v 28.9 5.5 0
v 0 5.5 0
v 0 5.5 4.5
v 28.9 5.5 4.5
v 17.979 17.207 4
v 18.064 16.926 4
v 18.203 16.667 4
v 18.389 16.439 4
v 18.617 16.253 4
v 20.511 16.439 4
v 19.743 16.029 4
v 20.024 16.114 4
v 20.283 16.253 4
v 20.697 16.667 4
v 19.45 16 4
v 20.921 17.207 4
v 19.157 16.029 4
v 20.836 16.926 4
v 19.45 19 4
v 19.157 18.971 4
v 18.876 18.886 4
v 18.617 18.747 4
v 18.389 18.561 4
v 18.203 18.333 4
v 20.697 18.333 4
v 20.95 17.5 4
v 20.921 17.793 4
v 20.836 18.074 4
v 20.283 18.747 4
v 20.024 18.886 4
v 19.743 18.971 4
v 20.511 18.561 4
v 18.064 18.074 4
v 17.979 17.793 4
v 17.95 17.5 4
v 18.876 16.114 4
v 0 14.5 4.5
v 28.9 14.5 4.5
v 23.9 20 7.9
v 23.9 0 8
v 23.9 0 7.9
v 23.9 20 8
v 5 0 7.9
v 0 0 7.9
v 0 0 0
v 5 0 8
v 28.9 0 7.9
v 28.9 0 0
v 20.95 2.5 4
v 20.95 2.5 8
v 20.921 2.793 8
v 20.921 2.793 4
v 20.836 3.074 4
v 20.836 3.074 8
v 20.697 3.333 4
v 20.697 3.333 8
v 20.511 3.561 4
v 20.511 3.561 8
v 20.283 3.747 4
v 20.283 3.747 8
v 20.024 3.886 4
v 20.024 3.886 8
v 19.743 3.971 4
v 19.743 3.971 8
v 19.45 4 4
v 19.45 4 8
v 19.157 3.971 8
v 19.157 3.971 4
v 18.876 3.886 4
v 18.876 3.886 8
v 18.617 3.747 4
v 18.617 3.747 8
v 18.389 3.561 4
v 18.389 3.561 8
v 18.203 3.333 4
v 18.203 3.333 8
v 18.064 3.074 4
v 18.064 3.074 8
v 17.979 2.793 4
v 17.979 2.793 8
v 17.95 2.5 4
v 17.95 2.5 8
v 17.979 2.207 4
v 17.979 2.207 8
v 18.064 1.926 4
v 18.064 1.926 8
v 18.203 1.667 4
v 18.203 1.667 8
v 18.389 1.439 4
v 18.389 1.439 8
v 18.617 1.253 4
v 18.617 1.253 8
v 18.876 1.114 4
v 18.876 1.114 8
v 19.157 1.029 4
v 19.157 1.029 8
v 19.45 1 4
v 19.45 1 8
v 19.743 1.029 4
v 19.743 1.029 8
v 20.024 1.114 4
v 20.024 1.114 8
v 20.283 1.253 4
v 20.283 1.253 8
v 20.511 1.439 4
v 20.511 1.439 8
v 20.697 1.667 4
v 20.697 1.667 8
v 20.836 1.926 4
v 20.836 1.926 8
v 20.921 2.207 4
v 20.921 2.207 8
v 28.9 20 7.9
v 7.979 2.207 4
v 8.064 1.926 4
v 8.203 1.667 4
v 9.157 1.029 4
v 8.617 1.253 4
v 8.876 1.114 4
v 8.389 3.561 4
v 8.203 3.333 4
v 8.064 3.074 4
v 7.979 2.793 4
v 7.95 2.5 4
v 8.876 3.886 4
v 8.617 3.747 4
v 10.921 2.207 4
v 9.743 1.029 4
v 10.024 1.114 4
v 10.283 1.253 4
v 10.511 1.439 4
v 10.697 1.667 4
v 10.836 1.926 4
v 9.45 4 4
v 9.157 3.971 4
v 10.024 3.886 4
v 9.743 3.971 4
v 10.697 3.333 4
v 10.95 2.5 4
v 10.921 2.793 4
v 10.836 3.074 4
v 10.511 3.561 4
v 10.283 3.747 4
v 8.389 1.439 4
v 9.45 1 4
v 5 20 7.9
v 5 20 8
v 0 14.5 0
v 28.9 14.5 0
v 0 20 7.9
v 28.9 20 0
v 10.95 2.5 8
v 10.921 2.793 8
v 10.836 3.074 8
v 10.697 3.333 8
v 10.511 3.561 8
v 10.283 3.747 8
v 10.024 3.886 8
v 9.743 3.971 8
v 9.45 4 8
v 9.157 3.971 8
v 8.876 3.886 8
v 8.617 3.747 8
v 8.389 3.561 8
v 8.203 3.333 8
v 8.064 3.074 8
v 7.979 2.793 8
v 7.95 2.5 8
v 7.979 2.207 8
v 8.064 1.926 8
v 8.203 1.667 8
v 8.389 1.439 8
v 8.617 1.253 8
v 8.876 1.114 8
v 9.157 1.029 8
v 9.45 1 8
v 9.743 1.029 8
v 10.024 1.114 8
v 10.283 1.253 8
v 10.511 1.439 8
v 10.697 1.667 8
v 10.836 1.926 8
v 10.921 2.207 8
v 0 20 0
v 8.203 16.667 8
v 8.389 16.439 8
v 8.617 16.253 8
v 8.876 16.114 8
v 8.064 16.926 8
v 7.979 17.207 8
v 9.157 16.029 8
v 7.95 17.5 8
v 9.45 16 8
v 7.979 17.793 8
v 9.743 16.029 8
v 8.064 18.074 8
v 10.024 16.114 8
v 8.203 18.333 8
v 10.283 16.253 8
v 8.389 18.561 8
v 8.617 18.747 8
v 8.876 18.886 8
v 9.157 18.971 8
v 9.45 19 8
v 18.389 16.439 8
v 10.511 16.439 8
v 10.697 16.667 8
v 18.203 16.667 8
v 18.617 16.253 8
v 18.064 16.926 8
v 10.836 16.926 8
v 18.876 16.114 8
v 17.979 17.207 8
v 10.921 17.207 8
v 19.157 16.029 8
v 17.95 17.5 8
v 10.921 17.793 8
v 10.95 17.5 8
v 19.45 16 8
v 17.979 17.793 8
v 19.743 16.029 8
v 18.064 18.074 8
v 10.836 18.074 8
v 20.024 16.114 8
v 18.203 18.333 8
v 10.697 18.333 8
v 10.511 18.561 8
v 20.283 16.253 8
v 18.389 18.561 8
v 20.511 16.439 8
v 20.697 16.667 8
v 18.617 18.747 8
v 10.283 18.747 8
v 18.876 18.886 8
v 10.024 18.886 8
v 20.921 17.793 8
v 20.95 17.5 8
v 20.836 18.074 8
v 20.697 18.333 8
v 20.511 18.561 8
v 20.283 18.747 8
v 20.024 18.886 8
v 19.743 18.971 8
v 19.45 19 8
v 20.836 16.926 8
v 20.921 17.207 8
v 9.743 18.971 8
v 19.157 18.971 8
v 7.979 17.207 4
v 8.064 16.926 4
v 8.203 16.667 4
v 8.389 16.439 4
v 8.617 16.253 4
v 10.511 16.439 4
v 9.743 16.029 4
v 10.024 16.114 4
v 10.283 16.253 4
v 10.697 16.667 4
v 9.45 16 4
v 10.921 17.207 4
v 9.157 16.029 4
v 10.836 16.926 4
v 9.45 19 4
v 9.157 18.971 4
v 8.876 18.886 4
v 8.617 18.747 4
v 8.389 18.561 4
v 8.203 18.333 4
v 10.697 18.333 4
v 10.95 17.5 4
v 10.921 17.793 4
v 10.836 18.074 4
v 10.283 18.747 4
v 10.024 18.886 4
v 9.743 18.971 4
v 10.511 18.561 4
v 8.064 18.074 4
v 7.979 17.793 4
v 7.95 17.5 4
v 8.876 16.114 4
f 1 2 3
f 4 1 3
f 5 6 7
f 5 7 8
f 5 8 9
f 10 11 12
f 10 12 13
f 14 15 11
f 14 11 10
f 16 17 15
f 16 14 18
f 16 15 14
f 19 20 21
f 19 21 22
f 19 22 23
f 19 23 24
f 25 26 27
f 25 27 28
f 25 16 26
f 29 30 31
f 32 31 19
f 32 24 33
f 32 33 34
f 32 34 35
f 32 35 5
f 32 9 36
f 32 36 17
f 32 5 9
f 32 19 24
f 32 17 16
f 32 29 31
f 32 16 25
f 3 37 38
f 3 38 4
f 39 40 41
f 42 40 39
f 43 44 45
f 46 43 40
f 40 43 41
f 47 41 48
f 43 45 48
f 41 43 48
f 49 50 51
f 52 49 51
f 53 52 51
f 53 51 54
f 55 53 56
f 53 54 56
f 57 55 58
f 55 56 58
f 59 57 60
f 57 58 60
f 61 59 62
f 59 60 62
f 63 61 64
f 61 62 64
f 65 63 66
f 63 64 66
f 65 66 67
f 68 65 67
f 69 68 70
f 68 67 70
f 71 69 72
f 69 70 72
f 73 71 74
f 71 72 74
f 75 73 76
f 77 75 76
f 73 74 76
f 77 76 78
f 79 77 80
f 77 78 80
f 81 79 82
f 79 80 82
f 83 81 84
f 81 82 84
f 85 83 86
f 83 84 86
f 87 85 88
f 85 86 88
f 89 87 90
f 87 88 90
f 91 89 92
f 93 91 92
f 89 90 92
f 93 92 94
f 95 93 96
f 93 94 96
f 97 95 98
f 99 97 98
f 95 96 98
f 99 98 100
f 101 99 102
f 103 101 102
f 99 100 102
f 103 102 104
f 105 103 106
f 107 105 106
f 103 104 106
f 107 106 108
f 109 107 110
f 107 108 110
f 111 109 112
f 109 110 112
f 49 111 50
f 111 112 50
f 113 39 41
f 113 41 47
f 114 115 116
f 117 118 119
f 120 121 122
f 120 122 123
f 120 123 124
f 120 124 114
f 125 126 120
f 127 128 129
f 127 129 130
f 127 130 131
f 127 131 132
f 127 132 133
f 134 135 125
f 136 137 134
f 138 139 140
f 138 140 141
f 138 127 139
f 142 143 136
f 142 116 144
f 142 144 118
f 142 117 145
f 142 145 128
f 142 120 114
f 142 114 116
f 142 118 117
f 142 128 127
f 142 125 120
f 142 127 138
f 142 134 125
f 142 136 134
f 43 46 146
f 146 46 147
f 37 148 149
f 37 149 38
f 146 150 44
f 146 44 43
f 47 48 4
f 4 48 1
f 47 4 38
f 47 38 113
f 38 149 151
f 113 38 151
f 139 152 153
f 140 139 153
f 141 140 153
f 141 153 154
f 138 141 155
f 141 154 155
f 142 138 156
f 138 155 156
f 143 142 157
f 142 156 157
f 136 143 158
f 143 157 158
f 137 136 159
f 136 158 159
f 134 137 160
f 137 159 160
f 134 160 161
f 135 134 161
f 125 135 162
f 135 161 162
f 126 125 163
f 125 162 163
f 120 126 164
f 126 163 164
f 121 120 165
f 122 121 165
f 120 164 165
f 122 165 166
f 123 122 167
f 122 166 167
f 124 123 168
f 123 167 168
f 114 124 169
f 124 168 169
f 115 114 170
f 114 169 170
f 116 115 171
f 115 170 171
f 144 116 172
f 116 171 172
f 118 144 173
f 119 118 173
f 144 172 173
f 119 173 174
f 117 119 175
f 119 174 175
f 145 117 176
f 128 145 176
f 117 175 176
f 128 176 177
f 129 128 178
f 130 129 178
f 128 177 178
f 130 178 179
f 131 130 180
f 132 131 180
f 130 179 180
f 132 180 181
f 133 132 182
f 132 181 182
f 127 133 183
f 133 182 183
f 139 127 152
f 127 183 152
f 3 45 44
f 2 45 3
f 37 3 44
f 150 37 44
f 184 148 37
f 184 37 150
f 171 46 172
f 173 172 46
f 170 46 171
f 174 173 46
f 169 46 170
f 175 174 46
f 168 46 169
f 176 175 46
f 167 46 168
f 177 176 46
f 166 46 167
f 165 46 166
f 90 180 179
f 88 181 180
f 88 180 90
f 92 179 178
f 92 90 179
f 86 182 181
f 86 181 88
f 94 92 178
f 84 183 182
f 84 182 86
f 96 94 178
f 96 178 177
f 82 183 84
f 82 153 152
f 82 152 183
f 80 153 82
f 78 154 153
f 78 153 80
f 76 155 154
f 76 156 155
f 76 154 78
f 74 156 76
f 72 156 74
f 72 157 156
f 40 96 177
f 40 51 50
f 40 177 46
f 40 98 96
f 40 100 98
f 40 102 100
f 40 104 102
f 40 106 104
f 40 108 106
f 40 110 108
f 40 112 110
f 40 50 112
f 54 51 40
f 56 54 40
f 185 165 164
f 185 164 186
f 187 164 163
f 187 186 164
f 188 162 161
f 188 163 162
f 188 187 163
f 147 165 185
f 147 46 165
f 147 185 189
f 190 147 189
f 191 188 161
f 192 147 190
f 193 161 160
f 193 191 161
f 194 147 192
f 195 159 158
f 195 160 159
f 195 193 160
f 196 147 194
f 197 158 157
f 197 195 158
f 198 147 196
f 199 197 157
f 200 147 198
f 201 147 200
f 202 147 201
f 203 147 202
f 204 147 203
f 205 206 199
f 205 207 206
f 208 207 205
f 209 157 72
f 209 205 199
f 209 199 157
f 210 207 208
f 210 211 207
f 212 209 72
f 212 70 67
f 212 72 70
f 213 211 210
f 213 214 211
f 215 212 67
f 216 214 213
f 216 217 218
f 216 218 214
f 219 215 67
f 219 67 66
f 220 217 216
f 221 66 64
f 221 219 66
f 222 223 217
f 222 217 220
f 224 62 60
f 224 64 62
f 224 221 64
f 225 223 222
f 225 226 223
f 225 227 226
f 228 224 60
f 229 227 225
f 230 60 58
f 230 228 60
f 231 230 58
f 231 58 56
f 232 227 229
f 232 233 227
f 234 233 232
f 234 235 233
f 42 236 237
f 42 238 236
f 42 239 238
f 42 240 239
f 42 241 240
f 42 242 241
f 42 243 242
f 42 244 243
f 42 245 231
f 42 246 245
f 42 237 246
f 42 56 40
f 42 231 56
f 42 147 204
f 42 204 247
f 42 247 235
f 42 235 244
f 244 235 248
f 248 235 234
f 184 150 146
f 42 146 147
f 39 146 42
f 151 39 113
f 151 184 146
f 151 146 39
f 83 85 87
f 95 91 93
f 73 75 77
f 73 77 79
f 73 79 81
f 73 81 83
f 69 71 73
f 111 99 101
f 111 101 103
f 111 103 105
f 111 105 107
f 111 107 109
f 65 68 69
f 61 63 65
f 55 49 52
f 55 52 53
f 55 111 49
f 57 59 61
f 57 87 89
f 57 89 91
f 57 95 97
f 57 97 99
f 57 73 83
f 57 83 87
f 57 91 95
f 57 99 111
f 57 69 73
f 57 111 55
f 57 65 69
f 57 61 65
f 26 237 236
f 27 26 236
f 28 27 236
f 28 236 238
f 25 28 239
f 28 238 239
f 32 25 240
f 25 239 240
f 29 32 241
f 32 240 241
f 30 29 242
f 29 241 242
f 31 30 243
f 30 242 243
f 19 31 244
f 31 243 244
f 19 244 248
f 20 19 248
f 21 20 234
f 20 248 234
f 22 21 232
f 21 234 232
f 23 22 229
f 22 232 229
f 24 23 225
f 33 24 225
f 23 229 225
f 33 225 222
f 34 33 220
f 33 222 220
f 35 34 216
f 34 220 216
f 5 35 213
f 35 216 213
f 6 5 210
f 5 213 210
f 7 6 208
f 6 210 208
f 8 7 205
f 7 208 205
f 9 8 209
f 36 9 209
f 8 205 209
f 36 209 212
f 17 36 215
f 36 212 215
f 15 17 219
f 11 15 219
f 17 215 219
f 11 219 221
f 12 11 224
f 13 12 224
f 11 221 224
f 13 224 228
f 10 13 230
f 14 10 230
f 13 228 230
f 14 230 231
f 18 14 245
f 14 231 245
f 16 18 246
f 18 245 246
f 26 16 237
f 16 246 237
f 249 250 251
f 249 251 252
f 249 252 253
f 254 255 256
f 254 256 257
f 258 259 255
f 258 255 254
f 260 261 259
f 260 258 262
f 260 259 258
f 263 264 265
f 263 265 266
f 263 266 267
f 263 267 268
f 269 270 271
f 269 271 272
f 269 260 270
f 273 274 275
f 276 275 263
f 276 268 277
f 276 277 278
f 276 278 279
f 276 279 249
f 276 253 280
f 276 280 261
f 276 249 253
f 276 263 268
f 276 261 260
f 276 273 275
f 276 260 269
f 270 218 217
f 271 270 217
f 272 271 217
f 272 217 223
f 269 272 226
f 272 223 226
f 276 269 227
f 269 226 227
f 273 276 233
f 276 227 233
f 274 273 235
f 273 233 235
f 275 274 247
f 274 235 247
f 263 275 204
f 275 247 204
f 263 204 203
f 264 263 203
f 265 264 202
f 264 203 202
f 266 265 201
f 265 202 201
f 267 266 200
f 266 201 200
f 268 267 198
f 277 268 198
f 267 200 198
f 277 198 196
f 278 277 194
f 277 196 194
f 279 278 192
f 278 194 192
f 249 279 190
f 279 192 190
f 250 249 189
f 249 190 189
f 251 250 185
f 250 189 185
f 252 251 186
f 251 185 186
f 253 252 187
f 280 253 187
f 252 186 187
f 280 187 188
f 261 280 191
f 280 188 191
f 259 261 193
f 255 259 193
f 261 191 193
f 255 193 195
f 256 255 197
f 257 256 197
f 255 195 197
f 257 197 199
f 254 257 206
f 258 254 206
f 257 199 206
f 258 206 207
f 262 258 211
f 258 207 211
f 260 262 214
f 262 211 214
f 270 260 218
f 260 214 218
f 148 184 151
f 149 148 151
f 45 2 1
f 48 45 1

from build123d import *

# Parameters (mm, degrees)
SKETCH002_W     = 28.9
SKETCH002_H     = 20
PAD001_DEPTH    = 8
SKETCH003_W     = 9
SKETCH003_H     = 4.5
POCKET001_DEPTH = 28.9
SKETCH004_R     = 1.5
POCKET002_DEPTH = 4
SKETCH005_W     = 5
SKETCH005_H     = 20
POCKET003_DEPTH = 0.1


with BuildPart() as part:
    # Sketch002 → Pad001 (new body)
    with BuildSketch(Plane.XY):
        with Locations((14.45, 10)):
            Rectangle(SKETCH002_W, SKETCH002_H)
    extrude(amount=PAD001_DEPTH)

    # Sketch003 (on Face4 of Pad001) → Pocket001 (cut)
    with BuildSketch(Plane(origin=(0, 0, 0), x_dir=(0, -1, 0), z_dir=(-1, 0, 0))):
        with Locations((-10, 2.25)):
            Rectangle(SKETCH003_W, SKETCH003_H)
    extrude(amount=-POCKET001_DEPTH, mode=Mode.SUBTRACT)

    # Sketch004 (on Face5 of Pocket001) → Pocket002 (cut)
    with BuildSketch(Plane.XY.offset(8)):
        with Locations((9.45, 17.5)):
            Circle(SKETCH004_R)
        with Locations((19.45, 17.5)):
            Circle(SKETCH004_R)
        with Locations((19.45, 2.5)):
            Circle(SKETCH004_R)
        with Locations((9.45, 2.5)):
            Circle(SKETCH004_R)
    extrude(amount=-POCKET002_DEPTH, mode=Mode.SUBTRACT)

    # Sketch005 (on Face5 of Pocket002) → Pocket003 (cut)
    with BuildSketch(Plane.XY.offset(8)):
        with Locations((2.5, 10)):
            Rectangle(SKETCH005_W, SKETCH005_H)
        with Locations((26.4, 10)):
            Rectangle(SKETCH005_W, SKETCH005_H)
    extrude(amount=-POCKET003_DEPTH, mode=Mode.SUBTRACT)


solid = part.part
